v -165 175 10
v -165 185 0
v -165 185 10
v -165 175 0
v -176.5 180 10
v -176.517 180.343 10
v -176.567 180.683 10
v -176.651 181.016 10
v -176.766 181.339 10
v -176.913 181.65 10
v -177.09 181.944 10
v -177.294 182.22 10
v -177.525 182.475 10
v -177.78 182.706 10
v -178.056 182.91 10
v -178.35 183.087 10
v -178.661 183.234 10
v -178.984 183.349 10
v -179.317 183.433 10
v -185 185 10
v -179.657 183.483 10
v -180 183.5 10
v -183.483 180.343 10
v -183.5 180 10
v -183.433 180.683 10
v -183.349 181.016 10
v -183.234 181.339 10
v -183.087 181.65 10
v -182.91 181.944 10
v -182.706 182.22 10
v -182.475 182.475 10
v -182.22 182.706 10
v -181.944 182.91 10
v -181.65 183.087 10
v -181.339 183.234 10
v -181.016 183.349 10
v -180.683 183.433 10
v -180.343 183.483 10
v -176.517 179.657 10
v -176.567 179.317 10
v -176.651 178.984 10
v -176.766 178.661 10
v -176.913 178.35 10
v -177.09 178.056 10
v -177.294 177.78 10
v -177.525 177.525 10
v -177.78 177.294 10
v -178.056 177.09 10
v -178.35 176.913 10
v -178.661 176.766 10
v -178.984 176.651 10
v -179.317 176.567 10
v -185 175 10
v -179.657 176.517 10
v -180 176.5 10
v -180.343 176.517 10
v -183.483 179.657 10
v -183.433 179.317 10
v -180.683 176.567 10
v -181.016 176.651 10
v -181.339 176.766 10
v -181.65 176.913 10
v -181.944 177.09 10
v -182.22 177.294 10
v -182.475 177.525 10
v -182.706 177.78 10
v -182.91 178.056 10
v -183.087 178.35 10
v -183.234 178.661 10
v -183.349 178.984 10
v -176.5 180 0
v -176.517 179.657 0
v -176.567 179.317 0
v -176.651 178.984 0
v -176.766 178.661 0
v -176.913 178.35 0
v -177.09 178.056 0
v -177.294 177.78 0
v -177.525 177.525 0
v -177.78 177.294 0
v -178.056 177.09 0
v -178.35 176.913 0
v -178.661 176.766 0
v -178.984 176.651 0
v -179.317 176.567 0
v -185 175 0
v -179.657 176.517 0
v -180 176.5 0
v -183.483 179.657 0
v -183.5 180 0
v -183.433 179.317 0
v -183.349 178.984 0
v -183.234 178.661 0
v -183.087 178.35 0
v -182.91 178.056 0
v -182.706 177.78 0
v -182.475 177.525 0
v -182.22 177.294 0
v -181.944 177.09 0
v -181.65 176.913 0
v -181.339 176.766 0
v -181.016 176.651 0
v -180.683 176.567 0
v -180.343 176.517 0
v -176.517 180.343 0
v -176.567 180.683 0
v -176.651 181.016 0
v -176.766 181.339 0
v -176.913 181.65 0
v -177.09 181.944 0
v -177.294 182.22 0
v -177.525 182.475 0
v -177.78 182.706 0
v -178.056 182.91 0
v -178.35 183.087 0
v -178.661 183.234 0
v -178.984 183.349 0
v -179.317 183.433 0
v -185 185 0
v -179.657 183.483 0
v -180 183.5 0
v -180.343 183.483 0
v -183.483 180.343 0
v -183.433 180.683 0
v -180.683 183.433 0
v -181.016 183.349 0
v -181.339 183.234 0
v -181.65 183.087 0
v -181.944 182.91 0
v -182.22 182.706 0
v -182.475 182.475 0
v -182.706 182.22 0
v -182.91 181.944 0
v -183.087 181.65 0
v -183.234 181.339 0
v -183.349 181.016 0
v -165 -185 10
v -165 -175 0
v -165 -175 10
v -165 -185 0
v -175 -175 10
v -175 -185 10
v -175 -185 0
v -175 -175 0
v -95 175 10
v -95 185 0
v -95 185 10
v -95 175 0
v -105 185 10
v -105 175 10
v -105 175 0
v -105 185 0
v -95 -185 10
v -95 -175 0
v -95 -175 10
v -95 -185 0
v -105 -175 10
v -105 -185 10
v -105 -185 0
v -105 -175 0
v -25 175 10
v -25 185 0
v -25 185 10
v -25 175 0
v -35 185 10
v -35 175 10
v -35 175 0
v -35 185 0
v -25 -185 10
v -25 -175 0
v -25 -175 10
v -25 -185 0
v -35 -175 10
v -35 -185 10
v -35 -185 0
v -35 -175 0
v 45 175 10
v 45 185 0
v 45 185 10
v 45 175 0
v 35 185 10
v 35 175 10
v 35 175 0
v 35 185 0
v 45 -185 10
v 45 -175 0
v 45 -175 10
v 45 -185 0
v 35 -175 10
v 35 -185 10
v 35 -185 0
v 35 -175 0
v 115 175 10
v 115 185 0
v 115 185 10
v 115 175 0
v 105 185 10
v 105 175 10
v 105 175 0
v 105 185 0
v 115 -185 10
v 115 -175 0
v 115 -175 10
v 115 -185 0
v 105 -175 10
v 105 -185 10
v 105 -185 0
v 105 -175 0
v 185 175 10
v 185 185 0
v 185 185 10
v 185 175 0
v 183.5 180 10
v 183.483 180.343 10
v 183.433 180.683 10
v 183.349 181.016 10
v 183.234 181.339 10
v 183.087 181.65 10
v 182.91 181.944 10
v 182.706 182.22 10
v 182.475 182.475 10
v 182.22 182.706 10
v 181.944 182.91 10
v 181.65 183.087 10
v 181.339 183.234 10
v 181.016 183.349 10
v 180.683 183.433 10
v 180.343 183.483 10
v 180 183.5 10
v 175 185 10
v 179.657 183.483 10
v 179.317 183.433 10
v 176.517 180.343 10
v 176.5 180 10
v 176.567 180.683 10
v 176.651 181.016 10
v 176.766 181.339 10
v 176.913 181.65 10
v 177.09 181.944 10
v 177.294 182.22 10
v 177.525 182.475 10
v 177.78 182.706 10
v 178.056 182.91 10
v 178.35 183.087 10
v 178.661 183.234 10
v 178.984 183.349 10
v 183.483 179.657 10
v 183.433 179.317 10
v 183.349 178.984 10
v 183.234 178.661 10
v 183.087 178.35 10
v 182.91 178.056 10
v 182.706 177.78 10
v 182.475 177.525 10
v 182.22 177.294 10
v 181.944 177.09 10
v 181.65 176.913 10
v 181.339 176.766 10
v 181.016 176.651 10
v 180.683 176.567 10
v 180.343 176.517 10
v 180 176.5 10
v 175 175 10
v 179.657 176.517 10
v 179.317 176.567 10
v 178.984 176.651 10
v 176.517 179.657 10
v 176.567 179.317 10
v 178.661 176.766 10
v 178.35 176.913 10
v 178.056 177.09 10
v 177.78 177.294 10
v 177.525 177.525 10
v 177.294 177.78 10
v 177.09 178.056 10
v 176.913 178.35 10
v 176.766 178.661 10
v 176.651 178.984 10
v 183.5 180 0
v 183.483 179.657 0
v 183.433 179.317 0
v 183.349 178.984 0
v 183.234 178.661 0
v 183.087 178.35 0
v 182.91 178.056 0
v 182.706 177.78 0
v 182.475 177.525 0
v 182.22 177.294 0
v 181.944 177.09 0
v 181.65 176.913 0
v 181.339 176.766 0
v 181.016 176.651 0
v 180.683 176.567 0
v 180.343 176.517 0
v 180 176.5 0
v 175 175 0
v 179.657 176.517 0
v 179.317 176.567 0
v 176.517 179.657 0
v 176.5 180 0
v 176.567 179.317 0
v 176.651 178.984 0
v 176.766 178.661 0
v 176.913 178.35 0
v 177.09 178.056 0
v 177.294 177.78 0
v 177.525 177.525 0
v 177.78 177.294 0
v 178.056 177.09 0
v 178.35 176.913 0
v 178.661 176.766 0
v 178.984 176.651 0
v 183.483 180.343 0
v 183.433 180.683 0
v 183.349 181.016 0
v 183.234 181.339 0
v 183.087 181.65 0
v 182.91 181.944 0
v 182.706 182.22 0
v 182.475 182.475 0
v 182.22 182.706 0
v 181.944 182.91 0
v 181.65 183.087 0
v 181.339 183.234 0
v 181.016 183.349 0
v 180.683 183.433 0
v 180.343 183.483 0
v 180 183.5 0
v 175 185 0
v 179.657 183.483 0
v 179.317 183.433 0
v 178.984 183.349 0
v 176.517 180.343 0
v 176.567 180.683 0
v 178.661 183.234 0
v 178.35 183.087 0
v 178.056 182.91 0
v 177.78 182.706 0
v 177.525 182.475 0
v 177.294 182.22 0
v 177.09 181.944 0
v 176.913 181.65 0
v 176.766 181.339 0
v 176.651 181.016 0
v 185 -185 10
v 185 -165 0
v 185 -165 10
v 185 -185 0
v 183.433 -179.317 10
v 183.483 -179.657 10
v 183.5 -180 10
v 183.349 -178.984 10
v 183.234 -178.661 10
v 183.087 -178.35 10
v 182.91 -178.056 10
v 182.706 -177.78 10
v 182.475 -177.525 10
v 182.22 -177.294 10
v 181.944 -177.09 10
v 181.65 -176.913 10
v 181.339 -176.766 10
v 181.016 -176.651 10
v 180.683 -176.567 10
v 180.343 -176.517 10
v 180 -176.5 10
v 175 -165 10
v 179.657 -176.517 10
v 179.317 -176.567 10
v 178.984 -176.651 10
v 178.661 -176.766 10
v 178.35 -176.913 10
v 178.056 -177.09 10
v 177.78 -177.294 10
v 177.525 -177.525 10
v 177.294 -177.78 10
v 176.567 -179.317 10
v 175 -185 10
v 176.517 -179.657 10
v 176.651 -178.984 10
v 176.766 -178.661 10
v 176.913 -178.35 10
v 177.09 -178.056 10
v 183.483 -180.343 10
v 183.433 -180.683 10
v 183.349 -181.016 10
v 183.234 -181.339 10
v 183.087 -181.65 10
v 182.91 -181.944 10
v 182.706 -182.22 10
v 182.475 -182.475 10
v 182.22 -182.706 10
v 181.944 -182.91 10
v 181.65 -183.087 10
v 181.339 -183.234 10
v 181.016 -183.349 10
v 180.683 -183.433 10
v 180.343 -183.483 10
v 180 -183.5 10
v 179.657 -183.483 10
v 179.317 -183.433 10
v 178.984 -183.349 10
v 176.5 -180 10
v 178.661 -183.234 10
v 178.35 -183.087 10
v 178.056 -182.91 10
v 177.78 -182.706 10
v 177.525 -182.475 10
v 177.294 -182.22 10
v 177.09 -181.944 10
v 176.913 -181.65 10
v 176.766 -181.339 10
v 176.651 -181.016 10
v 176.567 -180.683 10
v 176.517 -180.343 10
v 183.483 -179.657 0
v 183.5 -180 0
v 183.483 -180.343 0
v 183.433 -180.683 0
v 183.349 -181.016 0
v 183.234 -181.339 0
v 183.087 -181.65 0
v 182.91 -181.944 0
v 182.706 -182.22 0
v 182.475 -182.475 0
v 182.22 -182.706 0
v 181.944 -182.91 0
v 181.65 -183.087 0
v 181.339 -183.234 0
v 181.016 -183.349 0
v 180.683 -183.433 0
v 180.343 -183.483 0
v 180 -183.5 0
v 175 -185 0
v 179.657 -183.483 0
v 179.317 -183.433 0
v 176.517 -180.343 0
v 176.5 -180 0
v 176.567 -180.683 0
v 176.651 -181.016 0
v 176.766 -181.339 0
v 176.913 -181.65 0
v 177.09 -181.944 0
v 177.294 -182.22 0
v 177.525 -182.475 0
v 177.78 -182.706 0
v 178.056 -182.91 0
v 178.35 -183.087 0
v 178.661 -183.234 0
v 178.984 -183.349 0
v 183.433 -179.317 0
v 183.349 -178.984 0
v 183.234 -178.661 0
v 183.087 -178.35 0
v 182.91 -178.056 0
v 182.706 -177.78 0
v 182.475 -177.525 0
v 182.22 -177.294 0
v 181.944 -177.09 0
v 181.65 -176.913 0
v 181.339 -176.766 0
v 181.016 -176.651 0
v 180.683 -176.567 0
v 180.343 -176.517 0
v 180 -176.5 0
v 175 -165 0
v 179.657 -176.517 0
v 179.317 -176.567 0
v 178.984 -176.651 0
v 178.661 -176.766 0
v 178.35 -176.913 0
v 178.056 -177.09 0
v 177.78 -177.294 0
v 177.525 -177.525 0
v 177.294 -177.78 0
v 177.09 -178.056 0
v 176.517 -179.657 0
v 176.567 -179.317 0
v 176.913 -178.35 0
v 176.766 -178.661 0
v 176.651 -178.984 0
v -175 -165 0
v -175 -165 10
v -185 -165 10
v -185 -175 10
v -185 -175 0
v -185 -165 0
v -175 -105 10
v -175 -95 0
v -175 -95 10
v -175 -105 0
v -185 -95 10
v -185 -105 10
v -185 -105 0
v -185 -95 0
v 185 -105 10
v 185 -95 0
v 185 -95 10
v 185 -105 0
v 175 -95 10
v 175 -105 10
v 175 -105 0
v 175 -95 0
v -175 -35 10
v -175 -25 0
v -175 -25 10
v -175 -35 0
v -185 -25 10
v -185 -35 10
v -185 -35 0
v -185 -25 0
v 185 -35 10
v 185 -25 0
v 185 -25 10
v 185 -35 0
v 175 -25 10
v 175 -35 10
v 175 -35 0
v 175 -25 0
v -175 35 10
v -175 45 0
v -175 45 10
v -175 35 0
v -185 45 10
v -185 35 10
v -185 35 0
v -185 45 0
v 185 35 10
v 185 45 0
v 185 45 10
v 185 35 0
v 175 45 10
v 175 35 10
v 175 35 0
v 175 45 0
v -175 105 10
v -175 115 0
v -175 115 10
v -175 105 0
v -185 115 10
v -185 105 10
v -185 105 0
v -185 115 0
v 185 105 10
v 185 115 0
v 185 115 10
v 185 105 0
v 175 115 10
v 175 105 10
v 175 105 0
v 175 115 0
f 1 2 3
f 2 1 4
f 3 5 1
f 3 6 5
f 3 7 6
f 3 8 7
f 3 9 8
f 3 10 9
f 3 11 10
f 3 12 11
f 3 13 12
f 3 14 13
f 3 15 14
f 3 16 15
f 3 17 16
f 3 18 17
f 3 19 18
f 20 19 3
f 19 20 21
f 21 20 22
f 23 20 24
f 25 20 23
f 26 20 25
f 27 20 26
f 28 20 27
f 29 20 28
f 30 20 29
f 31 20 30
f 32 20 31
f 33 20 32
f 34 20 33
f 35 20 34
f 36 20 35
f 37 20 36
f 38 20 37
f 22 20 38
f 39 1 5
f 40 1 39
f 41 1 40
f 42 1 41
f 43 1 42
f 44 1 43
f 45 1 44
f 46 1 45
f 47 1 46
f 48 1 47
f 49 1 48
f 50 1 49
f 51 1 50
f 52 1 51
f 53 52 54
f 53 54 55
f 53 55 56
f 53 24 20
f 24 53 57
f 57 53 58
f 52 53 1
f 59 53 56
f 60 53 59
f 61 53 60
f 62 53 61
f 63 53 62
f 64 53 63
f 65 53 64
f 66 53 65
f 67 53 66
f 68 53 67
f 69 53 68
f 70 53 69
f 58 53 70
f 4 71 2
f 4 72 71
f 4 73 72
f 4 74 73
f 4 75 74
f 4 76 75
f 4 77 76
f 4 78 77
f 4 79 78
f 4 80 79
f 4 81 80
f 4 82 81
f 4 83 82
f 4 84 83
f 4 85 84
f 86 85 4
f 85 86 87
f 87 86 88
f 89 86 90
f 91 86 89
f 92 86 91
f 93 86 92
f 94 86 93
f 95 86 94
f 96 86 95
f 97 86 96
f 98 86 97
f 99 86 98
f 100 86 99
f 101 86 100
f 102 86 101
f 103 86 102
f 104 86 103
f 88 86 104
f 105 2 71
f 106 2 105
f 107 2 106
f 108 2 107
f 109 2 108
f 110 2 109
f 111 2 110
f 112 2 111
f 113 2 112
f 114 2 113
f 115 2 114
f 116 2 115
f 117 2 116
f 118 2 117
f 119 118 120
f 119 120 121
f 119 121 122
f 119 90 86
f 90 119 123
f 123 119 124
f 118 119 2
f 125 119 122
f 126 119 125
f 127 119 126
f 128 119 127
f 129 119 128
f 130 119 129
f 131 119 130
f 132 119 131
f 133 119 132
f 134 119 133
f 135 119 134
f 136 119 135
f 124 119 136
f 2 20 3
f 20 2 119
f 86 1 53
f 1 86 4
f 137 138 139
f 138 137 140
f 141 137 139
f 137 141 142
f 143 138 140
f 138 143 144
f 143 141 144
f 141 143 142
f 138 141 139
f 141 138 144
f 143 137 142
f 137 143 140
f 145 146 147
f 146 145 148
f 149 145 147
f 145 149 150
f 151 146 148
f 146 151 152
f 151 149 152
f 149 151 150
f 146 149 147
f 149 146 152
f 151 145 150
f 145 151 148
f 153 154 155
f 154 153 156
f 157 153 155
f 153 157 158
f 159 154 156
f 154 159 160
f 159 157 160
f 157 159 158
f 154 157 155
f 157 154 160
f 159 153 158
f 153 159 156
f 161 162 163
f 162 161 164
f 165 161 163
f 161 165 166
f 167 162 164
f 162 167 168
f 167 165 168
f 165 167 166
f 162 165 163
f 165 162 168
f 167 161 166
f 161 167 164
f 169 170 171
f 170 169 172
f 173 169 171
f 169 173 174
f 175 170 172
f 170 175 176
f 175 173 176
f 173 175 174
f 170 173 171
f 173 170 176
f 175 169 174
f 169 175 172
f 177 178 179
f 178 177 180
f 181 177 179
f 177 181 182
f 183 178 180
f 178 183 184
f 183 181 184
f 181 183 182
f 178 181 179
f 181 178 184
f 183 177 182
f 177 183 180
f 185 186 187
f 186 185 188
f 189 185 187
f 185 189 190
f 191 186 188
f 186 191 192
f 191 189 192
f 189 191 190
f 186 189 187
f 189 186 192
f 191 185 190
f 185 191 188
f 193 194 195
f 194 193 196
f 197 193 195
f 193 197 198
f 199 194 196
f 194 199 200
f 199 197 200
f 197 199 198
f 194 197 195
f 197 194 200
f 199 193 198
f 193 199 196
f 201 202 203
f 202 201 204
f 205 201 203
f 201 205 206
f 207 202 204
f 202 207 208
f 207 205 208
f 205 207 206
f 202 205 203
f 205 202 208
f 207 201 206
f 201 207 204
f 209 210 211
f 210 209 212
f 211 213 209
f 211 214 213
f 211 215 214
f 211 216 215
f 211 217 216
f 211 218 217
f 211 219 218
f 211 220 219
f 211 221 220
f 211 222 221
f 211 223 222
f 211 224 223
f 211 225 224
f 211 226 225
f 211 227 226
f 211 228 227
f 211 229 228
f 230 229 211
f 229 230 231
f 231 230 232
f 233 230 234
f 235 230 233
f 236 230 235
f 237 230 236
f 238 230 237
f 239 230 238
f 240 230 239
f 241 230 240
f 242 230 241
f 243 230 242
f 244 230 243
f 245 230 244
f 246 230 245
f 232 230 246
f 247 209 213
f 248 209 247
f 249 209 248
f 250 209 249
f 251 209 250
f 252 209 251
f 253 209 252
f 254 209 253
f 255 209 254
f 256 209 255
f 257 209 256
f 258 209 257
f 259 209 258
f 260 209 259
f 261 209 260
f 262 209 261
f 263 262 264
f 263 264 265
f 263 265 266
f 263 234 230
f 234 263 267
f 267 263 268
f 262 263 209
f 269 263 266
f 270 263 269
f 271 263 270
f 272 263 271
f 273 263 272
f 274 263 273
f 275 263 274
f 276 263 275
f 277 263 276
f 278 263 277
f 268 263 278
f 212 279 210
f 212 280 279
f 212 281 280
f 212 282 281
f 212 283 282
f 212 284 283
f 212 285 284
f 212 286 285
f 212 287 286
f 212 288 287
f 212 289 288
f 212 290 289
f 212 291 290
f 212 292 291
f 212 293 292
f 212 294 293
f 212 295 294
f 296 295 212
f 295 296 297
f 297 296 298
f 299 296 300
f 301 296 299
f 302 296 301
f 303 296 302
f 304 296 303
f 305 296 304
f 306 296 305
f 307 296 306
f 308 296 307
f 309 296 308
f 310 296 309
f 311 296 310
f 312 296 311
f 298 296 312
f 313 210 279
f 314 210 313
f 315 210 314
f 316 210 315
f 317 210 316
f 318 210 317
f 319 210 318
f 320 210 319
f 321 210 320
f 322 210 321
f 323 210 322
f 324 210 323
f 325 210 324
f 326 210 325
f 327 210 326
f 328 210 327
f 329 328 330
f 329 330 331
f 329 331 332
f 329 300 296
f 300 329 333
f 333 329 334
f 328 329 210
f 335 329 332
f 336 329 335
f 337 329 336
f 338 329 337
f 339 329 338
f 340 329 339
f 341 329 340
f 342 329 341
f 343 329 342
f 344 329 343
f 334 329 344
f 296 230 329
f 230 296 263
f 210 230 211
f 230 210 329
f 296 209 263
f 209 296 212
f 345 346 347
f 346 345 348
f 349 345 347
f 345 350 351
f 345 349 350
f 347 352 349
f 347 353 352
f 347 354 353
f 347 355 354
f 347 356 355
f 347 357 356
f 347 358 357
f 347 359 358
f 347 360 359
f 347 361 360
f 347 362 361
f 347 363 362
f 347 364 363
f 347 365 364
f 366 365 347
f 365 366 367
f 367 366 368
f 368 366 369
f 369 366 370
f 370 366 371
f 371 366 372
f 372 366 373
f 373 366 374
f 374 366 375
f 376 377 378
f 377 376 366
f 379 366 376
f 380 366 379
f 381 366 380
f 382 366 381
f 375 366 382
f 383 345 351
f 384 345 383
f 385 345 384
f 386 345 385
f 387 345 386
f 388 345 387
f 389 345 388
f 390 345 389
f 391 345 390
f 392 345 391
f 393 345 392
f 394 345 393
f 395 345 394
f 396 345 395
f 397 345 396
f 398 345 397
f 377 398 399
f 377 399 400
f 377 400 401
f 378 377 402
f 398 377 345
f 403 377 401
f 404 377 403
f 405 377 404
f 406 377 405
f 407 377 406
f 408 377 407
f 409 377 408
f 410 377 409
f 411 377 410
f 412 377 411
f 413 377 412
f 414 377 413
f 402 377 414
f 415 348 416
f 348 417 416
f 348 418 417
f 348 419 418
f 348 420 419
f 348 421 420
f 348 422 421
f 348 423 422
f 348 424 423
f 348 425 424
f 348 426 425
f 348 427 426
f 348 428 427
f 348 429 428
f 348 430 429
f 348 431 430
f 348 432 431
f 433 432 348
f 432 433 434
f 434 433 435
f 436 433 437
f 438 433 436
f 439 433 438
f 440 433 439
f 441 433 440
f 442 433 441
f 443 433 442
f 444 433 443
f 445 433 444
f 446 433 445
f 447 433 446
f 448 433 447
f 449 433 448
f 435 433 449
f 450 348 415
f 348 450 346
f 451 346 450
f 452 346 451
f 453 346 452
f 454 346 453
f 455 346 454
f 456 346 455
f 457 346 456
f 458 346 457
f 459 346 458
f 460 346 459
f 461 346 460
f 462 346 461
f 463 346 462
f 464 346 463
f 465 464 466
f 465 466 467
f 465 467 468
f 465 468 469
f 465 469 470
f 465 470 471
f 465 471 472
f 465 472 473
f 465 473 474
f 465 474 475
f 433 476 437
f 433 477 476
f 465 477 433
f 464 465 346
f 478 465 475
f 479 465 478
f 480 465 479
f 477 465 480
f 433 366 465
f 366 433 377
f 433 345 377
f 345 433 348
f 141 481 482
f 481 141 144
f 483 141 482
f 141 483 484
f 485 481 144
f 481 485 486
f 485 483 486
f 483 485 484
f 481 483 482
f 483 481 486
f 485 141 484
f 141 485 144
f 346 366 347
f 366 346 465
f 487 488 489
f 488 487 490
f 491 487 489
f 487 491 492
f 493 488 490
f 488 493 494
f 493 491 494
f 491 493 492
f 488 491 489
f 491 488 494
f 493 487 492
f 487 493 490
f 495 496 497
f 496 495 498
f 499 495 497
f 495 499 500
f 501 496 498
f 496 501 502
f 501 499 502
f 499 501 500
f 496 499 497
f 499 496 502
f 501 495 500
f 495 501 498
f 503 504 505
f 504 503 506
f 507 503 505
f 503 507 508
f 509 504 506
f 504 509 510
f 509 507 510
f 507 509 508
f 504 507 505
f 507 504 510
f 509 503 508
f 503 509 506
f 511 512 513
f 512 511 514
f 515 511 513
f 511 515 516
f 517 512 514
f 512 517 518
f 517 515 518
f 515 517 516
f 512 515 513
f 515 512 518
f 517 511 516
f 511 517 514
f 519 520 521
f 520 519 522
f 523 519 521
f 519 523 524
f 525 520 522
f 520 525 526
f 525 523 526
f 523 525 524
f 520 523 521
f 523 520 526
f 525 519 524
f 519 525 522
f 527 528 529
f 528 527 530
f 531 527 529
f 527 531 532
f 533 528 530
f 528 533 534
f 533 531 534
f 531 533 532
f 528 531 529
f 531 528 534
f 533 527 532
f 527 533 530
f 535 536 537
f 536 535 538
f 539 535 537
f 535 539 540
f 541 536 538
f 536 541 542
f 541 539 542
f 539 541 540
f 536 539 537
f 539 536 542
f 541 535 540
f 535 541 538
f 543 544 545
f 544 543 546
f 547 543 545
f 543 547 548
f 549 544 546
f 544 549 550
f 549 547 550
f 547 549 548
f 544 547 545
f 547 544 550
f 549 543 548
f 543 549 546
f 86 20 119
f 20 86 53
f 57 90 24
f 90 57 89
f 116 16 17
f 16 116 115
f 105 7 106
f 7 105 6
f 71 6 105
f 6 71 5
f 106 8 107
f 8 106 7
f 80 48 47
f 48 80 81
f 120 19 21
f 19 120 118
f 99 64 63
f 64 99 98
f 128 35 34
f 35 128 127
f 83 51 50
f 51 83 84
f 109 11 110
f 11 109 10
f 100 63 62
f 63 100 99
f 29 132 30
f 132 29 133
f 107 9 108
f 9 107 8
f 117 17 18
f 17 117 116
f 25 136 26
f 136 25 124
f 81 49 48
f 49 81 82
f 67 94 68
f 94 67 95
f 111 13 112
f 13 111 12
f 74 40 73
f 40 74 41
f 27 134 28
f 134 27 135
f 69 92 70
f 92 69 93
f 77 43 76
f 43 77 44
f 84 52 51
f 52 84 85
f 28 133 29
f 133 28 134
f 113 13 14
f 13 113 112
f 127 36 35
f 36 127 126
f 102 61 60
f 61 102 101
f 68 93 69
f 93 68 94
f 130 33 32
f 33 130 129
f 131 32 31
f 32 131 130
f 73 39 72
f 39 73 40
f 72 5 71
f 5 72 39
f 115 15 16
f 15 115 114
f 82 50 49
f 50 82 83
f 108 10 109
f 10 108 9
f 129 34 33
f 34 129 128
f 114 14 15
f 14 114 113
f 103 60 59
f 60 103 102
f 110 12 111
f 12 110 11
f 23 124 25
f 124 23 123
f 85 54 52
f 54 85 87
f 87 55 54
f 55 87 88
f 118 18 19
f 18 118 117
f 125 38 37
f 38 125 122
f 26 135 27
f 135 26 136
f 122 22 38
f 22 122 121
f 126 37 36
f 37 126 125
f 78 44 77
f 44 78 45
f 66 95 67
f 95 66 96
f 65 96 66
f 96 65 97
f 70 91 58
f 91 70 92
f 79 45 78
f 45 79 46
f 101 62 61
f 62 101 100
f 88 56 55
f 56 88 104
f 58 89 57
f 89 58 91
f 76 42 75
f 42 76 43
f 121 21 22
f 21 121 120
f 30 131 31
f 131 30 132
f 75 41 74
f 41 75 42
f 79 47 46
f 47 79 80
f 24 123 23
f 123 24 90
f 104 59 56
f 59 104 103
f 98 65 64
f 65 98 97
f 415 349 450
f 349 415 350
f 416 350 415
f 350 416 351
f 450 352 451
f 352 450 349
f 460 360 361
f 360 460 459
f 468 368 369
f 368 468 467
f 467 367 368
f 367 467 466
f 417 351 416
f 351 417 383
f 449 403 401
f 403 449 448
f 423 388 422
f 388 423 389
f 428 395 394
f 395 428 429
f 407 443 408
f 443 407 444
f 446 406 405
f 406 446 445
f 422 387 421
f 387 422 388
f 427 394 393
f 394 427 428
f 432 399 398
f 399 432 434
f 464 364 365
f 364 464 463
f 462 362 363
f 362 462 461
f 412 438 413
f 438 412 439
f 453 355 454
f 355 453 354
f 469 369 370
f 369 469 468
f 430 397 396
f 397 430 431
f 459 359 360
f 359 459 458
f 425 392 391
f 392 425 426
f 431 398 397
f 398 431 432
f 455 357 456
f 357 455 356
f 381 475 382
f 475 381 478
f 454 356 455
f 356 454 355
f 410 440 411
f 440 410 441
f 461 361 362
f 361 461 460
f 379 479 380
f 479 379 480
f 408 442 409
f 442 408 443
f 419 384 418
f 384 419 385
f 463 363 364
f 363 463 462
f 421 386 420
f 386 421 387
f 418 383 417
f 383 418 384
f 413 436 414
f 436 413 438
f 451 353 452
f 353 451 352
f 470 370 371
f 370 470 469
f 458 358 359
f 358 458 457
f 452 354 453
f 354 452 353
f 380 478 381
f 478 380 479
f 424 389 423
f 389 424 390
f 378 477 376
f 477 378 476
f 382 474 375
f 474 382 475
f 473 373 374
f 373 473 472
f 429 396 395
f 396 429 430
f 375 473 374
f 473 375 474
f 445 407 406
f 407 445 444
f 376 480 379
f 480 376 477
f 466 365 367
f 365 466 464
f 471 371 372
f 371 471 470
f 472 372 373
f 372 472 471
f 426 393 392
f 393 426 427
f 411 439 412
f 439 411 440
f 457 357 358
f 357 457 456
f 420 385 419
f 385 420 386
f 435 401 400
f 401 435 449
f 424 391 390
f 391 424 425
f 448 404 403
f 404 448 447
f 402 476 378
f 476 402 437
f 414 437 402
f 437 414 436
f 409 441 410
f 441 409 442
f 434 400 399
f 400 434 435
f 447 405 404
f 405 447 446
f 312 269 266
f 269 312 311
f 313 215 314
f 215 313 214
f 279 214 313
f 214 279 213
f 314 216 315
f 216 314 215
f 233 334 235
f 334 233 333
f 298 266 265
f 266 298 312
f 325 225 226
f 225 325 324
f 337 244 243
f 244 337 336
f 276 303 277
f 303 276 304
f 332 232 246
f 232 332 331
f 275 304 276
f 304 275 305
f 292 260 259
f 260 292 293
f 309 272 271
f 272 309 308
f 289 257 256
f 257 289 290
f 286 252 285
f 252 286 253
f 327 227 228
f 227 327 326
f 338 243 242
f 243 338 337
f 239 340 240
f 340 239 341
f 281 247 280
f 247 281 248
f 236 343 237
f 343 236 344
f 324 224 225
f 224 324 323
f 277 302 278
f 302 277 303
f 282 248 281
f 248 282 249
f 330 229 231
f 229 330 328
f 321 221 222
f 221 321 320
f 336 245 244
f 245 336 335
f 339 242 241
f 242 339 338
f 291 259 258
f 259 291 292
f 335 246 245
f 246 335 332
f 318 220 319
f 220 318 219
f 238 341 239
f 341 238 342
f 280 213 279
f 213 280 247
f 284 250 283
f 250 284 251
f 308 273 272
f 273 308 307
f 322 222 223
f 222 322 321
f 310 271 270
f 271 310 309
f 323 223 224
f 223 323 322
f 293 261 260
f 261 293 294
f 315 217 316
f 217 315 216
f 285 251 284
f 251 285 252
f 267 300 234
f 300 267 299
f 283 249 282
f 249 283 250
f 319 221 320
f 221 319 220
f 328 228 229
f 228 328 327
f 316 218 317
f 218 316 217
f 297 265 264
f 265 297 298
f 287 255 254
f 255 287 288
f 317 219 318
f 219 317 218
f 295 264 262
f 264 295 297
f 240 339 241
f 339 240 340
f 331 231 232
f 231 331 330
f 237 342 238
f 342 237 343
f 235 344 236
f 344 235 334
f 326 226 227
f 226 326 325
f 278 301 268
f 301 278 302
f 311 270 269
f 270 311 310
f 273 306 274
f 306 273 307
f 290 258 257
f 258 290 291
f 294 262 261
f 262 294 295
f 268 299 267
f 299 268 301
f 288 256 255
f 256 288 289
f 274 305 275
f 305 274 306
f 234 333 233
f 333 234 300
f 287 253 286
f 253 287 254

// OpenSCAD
// ring_46.scad - ring index 46 (z bottom = 460 mm)
$fn = 64; bar = 10; half_b = bar/2; outer = 370; half_outer = outer/2;
front_y = 180; back_y = -180; left_x = -180; right_x = 180;
x_centers = [-170, -100, -30, 40, 110, 180];
z_centers = [5, 85, 155, 225, 295, 365, 435, 505, 575, 645, 715]; ring_z = 460;
module place_box(cx, cy, sx, sy) { translate([cx - sx/2, cy - sy/2, 0]) cube([sx, sy, bar]); }

difference() { union() {
    for (x = x_centers) { place_box(x, front_y, bar, bar); place_box(x, back_y, bar, bar); }
    for (y = x_centers) { place_box(left_x, y, bar, bar); place_box(right_x, y, bar, bar); }
    for (zc = z_centers) if ((zc - half_b < ring_z + bar) && (zc + half_b > ring_z)) {
        translate([-half_outer, front_y - half_b, 0]) cube([outer, bar, bar]);
        translate([-half_outer, back_y - half_b, 0])  cube([outer, bar, bar]);
        translate([left_x - half_b, -half_outer, 0])  cube([bar, outer, bar]);
        translate([right_x - half_b, -half_outer, 0]) cube([bar, outer, bar]);
    }
  }
  for (cx = [-180, 180]) for (cy = [-180, 180]) translate([cx, cy, 0]) cylinder(h = bar, r = 3.5, $fn = 64);
}
